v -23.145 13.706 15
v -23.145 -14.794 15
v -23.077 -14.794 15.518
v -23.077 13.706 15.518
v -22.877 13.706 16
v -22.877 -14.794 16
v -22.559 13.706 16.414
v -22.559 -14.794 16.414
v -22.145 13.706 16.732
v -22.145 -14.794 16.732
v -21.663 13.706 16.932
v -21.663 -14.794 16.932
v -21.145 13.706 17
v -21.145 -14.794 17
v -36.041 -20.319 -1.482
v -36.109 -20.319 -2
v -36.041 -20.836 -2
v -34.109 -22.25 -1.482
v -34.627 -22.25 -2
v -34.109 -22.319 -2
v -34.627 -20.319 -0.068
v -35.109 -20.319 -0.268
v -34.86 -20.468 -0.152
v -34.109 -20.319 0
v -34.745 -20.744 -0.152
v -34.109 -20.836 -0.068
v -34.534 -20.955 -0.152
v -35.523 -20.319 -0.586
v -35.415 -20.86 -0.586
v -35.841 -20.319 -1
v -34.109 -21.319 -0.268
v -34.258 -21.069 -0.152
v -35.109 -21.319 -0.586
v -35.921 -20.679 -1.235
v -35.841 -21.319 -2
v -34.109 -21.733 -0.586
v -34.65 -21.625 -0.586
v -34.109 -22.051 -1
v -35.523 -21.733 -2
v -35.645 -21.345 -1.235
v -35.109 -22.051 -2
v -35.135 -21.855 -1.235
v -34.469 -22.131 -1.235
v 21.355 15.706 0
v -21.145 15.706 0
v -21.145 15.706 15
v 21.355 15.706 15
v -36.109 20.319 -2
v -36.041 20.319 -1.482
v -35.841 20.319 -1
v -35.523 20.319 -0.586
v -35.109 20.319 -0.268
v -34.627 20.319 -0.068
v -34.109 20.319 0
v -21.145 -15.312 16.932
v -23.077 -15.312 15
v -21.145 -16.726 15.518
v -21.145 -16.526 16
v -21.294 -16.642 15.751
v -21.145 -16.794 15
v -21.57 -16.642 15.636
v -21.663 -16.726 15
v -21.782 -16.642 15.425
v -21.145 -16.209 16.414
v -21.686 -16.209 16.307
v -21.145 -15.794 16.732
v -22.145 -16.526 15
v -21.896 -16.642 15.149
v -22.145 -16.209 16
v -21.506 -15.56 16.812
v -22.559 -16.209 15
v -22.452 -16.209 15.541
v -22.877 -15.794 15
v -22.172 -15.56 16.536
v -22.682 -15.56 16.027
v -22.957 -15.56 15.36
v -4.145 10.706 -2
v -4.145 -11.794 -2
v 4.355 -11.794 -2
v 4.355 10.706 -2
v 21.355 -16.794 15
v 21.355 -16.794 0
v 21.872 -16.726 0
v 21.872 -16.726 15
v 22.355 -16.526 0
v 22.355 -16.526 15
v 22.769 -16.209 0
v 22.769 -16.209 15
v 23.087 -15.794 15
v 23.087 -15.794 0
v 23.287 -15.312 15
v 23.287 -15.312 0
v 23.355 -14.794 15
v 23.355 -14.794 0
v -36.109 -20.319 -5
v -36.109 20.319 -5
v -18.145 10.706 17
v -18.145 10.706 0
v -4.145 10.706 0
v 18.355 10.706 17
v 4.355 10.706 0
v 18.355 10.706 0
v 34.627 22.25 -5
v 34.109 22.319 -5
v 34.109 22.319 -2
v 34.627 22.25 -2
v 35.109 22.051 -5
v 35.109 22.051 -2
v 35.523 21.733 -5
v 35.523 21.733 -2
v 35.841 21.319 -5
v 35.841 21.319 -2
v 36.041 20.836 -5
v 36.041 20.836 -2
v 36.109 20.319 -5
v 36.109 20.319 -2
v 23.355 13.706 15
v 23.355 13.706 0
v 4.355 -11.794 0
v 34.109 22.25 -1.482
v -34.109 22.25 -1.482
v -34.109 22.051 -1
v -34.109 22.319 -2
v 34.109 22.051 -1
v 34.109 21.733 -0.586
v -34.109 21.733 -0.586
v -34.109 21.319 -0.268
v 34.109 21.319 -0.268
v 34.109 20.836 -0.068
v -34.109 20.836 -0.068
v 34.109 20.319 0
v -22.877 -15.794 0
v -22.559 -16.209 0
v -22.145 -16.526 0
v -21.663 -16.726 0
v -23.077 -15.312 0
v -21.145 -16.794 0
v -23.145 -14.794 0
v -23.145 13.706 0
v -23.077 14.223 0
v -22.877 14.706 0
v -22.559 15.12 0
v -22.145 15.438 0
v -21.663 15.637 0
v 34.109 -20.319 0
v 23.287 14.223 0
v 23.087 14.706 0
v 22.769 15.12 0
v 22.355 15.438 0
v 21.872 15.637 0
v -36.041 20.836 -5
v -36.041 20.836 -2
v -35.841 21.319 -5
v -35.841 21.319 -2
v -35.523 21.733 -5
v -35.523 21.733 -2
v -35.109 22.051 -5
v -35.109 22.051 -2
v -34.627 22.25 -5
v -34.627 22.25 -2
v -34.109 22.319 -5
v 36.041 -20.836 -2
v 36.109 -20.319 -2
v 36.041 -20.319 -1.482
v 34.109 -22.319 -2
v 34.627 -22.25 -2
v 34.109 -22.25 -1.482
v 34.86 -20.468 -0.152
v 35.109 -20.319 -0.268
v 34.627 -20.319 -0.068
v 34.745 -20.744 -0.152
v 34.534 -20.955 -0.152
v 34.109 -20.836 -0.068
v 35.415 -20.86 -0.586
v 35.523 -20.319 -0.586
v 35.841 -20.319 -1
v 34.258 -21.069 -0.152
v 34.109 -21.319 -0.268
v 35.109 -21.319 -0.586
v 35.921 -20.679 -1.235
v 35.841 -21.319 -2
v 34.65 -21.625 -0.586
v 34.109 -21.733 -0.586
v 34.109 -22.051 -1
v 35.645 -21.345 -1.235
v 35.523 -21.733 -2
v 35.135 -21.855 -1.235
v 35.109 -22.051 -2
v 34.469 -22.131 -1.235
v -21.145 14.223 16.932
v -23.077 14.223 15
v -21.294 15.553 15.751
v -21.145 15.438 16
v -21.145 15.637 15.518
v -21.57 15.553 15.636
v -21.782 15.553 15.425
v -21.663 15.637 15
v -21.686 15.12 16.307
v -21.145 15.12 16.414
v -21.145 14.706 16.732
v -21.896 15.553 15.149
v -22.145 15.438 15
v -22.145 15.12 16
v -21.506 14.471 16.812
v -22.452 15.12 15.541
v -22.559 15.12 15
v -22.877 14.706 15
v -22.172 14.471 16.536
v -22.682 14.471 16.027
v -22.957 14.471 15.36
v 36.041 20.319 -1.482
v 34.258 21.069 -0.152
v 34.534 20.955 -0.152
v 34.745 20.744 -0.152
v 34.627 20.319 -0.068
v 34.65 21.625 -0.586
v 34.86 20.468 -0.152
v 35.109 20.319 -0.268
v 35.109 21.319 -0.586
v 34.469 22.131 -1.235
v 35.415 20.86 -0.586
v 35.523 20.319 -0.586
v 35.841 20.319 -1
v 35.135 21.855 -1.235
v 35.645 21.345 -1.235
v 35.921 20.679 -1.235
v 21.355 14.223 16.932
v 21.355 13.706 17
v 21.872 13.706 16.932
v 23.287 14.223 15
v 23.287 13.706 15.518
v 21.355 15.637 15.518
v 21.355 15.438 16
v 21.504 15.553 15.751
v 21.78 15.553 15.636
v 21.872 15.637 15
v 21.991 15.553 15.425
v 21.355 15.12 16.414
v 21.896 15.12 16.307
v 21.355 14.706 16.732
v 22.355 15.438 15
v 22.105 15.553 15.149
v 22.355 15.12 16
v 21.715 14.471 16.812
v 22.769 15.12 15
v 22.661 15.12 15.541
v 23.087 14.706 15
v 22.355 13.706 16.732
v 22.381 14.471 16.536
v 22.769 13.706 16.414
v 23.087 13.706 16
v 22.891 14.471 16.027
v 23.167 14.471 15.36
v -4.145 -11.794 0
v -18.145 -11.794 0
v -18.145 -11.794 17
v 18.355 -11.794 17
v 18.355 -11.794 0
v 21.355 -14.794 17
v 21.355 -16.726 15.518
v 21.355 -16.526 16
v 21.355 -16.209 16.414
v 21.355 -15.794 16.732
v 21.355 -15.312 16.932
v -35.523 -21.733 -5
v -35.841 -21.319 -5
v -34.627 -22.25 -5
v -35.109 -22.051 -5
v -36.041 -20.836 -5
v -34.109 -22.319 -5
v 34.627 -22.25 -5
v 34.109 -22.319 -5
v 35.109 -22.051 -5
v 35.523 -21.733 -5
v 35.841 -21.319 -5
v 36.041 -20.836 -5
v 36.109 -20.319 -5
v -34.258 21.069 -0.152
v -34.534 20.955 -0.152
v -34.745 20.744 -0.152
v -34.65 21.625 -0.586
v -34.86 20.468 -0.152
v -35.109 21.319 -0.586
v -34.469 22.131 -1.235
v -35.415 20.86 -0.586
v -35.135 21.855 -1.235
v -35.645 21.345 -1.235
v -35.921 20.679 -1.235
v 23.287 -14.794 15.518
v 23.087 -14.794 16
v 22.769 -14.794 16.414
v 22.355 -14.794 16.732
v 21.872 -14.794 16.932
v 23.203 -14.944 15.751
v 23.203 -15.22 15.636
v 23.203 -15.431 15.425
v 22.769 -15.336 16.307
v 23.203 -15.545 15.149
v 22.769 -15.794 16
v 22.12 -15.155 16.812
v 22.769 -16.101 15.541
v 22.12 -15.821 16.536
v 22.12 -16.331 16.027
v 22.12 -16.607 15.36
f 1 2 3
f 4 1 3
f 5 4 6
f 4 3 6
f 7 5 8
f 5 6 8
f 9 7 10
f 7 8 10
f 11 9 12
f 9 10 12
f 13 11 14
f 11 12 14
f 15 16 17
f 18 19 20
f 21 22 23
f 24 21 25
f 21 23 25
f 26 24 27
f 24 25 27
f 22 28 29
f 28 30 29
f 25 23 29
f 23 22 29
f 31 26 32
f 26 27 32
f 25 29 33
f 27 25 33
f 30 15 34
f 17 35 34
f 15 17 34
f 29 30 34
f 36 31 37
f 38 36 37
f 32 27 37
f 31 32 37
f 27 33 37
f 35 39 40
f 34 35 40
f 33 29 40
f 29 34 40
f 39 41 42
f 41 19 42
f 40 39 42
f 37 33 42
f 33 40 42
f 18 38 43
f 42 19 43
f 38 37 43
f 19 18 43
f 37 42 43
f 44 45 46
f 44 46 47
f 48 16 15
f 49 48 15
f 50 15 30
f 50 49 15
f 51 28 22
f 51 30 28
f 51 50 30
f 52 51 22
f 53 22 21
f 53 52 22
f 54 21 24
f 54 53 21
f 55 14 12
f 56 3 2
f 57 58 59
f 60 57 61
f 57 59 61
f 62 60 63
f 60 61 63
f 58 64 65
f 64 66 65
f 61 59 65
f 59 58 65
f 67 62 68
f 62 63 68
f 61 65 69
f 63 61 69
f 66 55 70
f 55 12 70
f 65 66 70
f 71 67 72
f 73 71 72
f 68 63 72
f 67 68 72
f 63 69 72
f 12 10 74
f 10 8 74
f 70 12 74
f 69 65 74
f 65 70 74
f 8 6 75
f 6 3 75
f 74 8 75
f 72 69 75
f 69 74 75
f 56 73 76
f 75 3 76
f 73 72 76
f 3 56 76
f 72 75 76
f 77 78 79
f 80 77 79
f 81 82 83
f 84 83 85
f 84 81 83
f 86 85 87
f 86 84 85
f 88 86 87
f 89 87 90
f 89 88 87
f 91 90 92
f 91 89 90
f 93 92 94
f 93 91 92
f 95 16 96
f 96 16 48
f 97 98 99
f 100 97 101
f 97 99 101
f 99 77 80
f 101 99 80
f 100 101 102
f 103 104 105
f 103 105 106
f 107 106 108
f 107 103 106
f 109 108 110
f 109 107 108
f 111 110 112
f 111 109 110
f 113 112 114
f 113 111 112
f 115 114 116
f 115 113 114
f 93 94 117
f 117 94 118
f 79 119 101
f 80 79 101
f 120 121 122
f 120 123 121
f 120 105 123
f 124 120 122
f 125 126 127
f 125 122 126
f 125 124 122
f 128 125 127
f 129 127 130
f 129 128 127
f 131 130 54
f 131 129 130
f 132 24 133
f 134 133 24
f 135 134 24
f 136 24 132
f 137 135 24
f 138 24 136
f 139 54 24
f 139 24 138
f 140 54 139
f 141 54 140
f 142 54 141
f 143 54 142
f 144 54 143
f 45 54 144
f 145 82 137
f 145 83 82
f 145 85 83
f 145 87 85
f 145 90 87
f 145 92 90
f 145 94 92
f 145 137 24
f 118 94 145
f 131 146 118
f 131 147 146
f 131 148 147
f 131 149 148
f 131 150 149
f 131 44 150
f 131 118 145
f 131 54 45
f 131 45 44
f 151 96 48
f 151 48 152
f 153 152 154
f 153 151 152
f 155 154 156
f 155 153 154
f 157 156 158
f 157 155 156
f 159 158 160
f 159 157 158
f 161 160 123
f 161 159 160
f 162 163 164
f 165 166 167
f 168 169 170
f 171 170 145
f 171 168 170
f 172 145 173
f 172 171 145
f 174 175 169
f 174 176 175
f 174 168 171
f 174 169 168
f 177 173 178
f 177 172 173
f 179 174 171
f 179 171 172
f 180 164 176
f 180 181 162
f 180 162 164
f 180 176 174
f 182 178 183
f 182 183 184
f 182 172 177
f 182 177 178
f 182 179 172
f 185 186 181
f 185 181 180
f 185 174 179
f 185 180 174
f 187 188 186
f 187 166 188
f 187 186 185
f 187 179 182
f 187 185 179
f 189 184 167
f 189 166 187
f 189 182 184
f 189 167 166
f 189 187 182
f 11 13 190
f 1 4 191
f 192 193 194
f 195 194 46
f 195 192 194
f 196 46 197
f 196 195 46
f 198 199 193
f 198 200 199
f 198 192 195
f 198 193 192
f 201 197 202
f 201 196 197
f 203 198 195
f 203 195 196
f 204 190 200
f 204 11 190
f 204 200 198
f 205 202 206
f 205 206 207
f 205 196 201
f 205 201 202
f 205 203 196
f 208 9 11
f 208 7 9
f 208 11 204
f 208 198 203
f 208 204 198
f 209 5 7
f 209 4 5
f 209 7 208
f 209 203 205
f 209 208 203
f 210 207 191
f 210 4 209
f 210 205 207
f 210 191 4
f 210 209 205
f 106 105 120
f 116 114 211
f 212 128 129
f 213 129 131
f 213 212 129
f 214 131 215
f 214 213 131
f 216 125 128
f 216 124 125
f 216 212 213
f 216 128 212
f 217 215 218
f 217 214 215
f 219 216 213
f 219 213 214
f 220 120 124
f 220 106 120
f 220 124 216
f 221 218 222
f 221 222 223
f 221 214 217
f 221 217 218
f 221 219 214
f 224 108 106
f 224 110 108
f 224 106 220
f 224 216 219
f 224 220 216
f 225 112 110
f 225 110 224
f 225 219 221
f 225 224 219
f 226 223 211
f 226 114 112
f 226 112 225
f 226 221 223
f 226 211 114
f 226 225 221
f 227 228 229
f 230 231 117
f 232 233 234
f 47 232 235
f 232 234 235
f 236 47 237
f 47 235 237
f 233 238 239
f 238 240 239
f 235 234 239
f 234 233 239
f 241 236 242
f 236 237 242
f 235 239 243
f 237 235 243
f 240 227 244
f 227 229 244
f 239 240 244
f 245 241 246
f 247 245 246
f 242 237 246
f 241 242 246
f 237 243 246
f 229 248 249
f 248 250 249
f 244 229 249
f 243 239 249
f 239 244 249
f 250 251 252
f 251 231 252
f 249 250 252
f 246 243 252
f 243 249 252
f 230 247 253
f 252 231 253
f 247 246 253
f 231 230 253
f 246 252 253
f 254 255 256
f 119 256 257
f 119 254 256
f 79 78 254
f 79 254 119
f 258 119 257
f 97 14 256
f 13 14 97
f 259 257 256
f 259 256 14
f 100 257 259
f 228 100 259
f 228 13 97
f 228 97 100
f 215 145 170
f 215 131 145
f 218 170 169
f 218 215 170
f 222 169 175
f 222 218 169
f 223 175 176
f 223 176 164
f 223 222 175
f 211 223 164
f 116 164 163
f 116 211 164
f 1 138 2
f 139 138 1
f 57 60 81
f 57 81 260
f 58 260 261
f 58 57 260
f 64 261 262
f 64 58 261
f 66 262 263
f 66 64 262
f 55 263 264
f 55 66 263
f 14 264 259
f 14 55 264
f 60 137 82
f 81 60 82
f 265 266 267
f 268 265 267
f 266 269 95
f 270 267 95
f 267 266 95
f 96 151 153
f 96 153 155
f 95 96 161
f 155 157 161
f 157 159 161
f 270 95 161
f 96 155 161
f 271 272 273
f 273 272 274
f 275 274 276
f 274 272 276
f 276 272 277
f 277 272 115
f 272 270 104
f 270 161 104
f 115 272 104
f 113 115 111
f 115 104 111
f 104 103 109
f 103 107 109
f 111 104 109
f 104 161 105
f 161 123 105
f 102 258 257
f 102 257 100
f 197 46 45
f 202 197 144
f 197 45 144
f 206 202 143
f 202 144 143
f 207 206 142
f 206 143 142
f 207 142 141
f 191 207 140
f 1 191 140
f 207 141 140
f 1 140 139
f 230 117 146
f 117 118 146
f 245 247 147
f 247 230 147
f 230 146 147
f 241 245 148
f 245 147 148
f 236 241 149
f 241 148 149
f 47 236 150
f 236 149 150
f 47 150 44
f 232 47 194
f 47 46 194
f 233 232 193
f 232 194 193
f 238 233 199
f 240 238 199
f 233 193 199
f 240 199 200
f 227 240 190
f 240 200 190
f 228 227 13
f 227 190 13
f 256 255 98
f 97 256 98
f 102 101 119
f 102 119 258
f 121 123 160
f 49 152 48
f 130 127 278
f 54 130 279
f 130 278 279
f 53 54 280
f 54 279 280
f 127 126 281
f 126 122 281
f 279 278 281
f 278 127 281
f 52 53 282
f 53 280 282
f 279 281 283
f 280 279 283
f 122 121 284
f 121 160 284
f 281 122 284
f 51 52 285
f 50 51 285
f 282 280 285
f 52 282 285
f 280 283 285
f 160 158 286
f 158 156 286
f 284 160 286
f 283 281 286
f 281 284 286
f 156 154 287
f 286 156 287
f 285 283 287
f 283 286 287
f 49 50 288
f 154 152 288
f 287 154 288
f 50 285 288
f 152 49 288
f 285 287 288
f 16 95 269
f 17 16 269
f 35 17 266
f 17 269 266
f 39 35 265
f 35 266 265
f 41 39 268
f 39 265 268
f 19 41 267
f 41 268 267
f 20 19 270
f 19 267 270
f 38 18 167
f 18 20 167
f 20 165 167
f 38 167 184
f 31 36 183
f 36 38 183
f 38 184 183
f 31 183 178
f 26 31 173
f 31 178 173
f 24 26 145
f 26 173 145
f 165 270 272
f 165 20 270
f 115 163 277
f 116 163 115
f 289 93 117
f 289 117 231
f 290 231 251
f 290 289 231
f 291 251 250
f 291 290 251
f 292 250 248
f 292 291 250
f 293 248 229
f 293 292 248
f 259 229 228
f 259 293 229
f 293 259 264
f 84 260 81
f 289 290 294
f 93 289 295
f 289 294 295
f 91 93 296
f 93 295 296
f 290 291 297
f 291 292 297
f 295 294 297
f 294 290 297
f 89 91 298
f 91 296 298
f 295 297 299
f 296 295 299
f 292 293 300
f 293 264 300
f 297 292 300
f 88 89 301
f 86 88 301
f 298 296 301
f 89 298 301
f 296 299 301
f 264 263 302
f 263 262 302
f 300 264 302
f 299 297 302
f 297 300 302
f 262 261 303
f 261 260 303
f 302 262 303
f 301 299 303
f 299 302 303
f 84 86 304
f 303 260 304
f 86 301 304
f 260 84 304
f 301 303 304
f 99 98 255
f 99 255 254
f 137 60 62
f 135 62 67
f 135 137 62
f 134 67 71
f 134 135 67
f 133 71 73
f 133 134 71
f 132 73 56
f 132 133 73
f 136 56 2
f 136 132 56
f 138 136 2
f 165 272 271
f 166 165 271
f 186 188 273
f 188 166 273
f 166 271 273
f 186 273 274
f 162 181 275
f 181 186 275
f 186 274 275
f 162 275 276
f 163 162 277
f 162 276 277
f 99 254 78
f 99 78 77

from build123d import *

# Parameters (mm, degrees)
F0_W     = 36.5
F0_H     = 22.5
F1_DEPTH = 17
F2_T     = 5
F3_W     = 8.5
F3_H     = 22.5
F4_DEPTH = 2
F0_W_2   = 72.2177475691
F0_H_2   = 44.6370989084
F5_DEPTH = 5
F6_R     = 2


# Not quite as in the source:
# - two fillets or chamfers of one size are made in one step


with BuildPart() as f1:
    # F0 (on Top) → F1 (new body)
    with BuildSketch(Plane.XY):
        with Locations((0.1048383191, -0.5443561636)):
            Rectangle(F0_W, F0_H)
    extrude(amount=F1_DEPTH)

    # F2
    f2_openings = [f1.faces().sort_by_distance(p)[0] for p in [
        (0.104838, -0.544356, 17),
    ]]
    offset(amount=F2_T, openings=f2_openings, kind=Kind.INTERSECTION)

    # F3 (on face) → F4 (cut)
    with BuildSketch(Plane.XY):
        with Locations((0.1048383191, -0.5443561636)):
            Rectangle(F3_W, F3_H)
    extrude(amount=-F4_DEPTH, mode=Mode.SUBTRACT)

    # F0 (on Top) → F5 (join)
    with BuildSketch(Plane.XY):
        Rectangle(F0_W_2, F0_H_2)
        with Locations((0.1048383191, -0.5443561636)):
            Rectangle(F0_W, F0_H, mode=Mode.SUBTRACT)
    extrude(amount=-F5_DEPTH)

    # F6
    f6_edges = [f1.edges().sort_by_distance(p)[0] for p in [
        (36.108874, -22.318549, -2.5),
        (36.108874, 22.318549, -2.5),
        (-36.108874, -22.318549, -2.5),
        (-36.108874, 22.318549, -2.5),
        (-23.145162, -0.544356, 17),
        (0.104838, -16.794356, 17),
        (23.354838, -0.544356, 17),
        (0.104838, 15.705644, 17),
        (-23.145162, -16.794356, 8.5),
        (-23.145162, 15.705644, 8.5),
        (23.354838, -16.794356, 8.5),
        (23.354838, 15.705644, 8.5),
        (0, 22.318549, 0),
        (36.108874, 0, 0),
        (-36.108874, 0, 0),
        (0, -22.318549, 0),
    ]]
    fillet(f6_edges, radius=F6_R)


solid = f1.part
